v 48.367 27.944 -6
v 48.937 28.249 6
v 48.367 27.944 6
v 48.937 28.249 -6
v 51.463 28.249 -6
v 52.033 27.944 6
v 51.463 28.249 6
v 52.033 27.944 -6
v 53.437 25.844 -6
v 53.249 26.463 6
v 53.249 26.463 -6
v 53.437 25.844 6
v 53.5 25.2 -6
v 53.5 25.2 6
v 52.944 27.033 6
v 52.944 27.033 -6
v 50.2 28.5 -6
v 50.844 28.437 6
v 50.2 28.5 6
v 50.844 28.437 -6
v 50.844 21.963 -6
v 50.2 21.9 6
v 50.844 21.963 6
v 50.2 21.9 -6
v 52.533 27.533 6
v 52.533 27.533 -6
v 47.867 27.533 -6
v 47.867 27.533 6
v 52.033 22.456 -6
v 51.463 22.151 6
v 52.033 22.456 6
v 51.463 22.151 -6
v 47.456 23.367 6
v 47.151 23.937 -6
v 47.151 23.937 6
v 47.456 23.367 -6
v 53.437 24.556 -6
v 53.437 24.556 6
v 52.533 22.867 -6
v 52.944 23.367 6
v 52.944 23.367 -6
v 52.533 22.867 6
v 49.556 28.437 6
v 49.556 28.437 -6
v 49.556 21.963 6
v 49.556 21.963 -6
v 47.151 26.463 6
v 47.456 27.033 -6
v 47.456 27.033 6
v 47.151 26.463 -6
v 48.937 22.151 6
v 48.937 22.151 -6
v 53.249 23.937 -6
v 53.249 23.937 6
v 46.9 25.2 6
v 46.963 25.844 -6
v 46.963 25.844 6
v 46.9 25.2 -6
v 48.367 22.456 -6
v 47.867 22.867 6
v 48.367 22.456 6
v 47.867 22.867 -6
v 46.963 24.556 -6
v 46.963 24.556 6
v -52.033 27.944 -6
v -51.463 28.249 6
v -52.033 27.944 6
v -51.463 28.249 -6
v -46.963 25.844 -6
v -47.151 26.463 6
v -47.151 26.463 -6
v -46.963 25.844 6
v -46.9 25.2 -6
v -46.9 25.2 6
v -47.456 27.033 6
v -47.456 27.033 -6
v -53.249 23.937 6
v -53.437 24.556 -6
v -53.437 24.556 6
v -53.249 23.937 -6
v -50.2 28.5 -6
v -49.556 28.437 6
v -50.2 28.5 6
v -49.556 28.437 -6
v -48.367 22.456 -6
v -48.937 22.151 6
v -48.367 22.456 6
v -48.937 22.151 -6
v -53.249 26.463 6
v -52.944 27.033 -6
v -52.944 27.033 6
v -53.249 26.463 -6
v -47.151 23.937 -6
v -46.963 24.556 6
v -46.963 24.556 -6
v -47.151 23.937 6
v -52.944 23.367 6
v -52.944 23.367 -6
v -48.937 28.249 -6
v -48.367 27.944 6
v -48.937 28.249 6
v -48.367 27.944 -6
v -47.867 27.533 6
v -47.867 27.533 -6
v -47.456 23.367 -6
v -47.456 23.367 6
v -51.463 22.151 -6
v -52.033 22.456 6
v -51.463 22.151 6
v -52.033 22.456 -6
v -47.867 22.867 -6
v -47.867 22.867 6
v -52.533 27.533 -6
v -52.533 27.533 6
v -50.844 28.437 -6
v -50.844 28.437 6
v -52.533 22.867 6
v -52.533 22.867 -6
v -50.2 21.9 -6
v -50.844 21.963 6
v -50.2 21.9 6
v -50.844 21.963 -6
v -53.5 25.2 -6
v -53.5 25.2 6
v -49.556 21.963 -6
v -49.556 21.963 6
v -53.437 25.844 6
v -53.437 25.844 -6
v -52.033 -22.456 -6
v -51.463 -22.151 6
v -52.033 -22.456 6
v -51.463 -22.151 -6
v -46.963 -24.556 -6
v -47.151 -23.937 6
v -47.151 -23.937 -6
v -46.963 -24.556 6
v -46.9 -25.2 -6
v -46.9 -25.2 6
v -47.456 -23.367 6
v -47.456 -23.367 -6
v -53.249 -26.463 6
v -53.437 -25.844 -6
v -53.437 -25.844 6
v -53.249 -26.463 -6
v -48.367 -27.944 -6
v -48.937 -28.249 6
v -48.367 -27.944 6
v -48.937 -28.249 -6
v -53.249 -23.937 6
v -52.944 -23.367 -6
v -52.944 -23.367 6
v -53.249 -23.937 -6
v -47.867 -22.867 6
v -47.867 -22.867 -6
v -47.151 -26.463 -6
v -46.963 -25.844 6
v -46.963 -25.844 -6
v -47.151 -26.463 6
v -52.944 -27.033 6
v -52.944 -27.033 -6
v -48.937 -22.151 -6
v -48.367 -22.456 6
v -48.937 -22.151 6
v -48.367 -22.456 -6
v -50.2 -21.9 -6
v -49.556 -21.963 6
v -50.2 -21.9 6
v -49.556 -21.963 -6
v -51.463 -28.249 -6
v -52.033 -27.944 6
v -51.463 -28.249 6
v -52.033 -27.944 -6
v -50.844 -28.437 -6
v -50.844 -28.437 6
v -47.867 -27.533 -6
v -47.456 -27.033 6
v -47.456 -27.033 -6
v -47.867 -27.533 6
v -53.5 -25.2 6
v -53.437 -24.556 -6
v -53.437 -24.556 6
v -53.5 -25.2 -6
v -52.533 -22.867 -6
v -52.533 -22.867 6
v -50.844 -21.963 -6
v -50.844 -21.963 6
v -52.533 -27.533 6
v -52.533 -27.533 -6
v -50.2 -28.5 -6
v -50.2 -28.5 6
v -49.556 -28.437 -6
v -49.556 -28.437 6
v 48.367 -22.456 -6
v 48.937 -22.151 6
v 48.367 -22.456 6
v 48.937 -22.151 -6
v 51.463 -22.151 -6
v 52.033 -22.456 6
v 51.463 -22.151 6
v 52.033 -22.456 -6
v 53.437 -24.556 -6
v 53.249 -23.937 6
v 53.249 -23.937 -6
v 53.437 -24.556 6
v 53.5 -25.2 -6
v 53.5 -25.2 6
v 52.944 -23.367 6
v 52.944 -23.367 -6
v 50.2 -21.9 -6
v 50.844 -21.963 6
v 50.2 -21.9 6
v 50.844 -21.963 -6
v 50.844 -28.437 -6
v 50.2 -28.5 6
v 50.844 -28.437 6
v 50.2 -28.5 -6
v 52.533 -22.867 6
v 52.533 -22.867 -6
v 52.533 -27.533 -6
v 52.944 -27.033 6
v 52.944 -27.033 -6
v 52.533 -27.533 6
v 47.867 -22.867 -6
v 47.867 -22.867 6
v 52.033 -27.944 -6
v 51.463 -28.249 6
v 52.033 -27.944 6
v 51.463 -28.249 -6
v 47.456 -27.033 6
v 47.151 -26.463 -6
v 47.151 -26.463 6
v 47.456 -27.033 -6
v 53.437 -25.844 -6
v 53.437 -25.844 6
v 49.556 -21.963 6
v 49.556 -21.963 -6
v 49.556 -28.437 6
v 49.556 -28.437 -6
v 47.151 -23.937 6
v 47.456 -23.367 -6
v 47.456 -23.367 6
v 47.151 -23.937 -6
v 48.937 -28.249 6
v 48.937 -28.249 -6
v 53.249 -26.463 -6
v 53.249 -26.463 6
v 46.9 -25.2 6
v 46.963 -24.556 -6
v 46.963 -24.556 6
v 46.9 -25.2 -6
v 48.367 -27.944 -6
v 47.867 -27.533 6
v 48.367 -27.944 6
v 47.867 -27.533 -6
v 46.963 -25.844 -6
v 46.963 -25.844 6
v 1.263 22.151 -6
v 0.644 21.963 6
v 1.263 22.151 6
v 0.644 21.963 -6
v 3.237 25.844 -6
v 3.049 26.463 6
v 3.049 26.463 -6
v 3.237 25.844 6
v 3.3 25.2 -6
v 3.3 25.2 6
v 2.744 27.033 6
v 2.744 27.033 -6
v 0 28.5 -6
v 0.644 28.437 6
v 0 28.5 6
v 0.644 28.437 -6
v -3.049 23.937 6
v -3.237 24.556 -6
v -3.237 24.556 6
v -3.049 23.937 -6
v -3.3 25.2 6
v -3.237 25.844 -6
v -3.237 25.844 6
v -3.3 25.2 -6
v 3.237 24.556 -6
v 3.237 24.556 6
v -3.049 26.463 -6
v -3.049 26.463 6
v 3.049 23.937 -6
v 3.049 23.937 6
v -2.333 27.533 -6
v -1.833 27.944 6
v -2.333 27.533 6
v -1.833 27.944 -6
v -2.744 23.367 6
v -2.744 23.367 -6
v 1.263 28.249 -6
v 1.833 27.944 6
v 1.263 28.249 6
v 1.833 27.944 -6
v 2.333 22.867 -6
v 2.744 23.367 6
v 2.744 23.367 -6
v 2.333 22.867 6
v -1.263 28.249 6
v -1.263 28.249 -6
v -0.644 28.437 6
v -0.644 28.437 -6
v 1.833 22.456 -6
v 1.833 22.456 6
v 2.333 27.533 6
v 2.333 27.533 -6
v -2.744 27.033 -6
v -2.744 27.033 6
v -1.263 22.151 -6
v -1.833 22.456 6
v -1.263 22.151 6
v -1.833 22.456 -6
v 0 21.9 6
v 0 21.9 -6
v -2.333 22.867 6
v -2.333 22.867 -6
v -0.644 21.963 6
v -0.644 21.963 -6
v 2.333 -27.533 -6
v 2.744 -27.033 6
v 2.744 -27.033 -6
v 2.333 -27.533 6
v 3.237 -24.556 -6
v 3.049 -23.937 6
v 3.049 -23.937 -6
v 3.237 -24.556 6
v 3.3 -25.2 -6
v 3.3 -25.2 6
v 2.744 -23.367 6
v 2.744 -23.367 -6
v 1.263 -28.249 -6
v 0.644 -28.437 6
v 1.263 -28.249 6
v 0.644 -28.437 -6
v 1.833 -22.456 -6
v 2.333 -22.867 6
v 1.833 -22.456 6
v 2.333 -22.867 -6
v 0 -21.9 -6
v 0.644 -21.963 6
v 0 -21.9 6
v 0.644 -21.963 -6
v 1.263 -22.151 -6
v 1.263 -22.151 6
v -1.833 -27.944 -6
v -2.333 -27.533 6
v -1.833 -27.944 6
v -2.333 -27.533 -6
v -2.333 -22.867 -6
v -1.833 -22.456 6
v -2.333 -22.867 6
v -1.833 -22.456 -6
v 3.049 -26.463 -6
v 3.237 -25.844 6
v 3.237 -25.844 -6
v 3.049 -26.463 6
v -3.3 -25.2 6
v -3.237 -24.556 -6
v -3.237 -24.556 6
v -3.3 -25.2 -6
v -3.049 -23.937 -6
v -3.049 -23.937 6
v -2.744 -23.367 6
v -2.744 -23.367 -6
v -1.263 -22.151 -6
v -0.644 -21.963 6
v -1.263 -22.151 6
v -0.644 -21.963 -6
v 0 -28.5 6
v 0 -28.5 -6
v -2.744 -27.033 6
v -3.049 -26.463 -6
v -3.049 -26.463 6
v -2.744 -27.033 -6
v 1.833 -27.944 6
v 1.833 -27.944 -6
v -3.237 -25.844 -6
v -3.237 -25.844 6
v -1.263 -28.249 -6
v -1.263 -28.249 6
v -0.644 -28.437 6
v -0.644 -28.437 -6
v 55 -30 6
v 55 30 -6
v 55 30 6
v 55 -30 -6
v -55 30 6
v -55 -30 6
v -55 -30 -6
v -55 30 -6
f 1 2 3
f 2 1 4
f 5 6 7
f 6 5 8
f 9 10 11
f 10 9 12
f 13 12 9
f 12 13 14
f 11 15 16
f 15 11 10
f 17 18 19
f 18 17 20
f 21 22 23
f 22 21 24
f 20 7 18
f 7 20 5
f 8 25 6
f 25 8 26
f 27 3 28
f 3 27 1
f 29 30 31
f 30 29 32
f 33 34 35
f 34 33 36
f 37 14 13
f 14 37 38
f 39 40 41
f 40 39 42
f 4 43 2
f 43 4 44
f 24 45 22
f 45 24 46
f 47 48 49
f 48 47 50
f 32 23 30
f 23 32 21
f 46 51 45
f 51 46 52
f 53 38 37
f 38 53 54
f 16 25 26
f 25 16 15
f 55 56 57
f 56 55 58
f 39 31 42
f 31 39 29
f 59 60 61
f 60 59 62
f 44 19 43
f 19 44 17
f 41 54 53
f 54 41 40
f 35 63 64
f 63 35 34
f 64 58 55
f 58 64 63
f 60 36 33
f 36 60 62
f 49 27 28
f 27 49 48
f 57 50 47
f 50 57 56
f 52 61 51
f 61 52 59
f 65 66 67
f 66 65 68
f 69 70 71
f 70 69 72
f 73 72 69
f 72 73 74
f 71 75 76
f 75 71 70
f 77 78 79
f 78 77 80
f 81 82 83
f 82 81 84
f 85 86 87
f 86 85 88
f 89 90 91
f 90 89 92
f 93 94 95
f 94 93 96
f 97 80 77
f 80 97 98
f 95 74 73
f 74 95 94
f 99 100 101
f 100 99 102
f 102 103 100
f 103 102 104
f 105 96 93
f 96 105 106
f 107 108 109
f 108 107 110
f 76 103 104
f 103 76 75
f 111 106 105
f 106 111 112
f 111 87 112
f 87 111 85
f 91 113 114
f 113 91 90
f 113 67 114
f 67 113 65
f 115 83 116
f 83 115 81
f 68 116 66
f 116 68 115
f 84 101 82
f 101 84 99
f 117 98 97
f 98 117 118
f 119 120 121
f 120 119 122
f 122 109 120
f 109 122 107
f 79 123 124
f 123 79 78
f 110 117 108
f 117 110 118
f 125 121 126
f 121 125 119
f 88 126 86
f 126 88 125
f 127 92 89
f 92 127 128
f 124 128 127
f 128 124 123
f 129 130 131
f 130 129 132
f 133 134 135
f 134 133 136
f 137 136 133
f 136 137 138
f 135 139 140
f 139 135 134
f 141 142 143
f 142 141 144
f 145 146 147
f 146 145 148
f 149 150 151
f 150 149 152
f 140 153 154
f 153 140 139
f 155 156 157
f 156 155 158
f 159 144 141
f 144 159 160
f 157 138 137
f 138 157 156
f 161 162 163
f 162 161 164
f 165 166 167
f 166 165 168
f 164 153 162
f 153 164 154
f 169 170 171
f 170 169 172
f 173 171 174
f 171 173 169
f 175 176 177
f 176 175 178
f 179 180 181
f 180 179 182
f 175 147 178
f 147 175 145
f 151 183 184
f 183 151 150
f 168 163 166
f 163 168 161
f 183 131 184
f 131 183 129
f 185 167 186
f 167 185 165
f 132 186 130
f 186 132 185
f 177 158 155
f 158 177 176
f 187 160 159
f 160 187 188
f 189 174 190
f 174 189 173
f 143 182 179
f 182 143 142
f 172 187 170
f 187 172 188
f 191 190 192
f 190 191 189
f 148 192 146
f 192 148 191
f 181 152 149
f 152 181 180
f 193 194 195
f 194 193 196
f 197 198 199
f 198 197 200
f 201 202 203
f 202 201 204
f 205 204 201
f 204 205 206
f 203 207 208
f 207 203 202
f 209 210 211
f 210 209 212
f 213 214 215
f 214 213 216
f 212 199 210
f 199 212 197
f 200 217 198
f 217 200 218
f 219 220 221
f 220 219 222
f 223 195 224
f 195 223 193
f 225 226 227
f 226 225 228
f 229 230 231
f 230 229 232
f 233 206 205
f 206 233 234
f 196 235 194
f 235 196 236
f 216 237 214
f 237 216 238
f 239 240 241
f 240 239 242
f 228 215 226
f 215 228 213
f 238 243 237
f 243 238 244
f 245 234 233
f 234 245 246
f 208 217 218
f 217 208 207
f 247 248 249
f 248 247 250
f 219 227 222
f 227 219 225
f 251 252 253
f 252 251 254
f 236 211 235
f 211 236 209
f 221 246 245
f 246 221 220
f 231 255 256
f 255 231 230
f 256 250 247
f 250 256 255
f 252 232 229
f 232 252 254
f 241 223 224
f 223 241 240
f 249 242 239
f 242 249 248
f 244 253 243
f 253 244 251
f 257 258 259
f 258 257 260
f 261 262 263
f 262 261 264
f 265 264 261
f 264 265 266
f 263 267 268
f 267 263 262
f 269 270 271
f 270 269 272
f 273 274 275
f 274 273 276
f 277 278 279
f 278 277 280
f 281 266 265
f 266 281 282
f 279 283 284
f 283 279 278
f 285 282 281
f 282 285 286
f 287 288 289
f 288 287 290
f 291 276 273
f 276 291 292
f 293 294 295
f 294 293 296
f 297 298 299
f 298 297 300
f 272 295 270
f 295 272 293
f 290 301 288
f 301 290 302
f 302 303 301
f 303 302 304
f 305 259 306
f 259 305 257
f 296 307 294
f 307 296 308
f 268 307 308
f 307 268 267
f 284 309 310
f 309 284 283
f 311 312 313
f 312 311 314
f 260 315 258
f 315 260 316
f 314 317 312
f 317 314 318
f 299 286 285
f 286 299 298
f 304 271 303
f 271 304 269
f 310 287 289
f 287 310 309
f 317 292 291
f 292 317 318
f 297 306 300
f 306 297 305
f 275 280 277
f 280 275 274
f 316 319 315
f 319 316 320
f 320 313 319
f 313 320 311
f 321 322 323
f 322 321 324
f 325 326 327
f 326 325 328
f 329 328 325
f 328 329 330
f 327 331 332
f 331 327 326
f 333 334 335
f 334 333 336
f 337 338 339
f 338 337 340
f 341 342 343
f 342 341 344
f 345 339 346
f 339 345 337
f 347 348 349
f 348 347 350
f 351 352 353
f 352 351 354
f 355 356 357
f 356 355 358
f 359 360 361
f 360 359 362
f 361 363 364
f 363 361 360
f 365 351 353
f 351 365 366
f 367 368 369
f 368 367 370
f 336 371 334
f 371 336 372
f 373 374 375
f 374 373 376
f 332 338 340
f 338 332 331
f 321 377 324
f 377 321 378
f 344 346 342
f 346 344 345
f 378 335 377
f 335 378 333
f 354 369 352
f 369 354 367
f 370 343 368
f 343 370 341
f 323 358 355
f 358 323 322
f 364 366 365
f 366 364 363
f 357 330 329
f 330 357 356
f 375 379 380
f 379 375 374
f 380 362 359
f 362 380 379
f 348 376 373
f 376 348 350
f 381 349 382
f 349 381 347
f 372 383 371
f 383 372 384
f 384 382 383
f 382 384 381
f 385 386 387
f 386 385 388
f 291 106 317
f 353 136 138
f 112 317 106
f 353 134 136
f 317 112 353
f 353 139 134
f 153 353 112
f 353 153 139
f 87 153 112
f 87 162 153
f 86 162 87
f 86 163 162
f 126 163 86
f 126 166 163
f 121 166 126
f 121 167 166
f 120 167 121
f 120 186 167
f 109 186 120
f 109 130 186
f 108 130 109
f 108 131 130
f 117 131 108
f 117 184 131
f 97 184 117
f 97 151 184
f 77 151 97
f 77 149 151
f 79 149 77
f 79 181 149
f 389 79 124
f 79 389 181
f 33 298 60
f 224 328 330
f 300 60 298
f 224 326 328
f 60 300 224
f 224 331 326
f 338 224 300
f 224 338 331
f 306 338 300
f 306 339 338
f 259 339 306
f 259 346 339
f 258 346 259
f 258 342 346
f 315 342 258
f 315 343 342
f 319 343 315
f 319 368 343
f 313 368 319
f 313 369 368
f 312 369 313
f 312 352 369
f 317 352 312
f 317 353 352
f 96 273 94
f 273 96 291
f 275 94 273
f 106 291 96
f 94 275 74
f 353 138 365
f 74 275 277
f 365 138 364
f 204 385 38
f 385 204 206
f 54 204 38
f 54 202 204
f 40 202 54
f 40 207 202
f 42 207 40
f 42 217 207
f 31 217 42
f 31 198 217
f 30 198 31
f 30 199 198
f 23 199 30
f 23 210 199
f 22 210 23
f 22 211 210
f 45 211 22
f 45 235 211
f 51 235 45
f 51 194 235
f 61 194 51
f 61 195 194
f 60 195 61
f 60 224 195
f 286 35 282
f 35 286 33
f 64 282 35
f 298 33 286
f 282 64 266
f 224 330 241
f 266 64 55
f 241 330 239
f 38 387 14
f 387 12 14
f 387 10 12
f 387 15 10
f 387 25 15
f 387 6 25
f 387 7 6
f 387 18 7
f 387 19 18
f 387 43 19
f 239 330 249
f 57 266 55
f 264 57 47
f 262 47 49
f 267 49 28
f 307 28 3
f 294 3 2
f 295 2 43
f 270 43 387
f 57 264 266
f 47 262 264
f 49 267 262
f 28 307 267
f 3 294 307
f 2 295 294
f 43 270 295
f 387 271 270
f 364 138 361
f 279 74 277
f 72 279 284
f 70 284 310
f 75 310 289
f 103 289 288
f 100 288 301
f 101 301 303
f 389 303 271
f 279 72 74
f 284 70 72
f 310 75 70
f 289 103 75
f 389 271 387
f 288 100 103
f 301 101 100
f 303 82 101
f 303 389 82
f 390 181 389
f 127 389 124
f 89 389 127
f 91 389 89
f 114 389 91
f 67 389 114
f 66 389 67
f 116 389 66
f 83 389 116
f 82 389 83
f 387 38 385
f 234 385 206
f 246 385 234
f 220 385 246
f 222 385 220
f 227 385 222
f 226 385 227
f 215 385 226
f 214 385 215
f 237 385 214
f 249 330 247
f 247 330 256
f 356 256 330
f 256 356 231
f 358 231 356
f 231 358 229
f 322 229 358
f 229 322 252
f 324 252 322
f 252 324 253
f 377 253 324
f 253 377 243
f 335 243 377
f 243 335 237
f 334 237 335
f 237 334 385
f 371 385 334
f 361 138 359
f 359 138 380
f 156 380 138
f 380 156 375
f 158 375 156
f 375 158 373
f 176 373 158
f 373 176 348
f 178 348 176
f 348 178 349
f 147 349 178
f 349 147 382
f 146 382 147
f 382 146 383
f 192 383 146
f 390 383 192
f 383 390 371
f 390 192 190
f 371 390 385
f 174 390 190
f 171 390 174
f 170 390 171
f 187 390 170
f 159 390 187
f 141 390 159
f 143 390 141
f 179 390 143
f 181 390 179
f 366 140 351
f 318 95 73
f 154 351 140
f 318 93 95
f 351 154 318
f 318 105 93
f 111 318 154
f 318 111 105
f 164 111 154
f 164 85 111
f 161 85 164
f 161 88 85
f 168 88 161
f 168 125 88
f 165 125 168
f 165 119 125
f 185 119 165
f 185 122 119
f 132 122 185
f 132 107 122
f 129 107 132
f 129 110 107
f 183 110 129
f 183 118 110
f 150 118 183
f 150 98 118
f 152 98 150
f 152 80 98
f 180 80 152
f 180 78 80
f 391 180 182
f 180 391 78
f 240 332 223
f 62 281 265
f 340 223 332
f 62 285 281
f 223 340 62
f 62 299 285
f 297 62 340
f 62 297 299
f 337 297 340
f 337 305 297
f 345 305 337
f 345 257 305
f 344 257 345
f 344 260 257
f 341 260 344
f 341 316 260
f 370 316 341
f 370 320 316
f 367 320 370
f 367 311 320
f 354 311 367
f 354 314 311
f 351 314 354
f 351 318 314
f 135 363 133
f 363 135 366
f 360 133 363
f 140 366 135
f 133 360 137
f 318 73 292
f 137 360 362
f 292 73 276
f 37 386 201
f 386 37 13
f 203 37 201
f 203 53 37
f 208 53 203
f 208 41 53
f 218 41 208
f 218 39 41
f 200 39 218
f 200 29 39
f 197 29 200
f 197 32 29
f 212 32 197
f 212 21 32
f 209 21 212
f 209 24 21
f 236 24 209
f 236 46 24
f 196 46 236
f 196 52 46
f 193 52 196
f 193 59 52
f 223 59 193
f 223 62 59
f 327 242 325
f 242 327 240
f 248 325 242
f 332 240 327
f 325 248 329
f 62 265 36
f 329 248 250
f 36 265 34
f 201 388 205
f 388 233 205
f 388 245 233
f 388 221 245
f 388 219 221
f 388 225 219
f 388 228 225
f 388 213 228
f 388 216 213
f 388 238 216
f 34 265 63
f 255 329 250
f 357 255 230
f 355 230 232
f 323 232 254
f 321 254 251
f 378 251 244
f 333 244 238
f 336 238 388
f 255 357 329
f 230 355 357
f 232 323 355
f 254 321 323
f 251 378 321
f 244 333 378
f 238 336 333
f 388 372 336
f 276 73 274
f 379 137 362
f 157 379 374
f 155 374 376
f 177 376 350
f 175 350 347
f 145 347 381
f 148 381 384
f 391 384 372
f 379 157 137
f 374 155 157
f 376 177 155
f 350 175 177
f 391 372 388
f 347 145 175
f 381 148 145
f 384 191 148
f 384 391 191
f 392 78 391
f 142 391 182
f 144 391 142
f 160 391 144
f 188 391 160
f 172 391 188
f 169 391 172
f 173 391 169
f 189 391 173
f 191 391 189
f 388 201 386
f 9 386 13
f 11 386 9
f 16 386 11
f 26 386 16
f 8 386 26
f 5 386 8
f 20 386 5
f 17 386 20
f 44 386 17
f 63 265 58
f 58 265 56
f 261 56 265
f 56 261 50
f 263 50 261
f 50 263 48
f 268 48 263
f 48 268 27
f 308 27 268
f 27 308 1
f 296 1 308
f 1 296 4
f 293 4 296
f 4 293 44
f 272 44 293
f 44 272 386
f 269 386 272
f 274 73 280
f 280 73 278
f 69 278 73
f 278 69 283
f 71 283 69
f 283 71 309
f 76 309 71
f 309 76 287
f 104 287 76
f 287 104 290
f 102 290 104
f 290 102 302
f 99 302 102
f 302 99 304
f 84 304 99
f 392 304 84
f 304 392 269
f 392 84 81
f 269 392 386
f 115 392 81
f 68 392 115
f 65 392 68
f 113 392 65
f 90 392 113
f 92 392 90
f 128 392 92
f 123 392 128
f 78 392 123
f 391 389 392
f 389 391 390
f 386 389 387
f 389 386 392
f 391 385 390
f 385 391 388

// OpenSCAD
$fn = 32;

// ----------------------------------------------------------------------
// Corner plate 110 x 60 x 12
// 6 holes, centres taken from the edge offset
// ----------------------------------------------------------------------

// --- parameters (mm) ---
plate = [110, 60, 12];  // overall size (x, y, z)
seat_tol = 0.15;        // tolerance at the seating features
free_tol = 0.5;         // general tolerance on the free sizes
holes = 6;              // number of holes the drawing asks for
hole_d = 6.6;           // hole diameter
edge = 4.8;             // hole centre offset from the plate edge

// --- derived feature positions (mm) ---
corner_x = plate[0] / 2 - edge;  // = 50.2   corner hole X
corner_y = plate[1] / 2 - edge;  // = 25.2   corner hole Y
feature_centers = [
  [corner_x, corner_y],
  [-corner_x, corner_y],
  [-corner_x, -corner_y],
  [corner_x, -corner_y],
  [0, corner_y],
  [0, -corner_y]
];   // hole centres the loop below drills

// plate outline, every hole drilled through with the same cutters
difference() {
  cube(plate, center = true);
  for (centre = feature_centers)
    translate([centre[0], centre[1], 0])
      cylinder(d = hole_d, h = plate[2] + 2, center = true);
}
